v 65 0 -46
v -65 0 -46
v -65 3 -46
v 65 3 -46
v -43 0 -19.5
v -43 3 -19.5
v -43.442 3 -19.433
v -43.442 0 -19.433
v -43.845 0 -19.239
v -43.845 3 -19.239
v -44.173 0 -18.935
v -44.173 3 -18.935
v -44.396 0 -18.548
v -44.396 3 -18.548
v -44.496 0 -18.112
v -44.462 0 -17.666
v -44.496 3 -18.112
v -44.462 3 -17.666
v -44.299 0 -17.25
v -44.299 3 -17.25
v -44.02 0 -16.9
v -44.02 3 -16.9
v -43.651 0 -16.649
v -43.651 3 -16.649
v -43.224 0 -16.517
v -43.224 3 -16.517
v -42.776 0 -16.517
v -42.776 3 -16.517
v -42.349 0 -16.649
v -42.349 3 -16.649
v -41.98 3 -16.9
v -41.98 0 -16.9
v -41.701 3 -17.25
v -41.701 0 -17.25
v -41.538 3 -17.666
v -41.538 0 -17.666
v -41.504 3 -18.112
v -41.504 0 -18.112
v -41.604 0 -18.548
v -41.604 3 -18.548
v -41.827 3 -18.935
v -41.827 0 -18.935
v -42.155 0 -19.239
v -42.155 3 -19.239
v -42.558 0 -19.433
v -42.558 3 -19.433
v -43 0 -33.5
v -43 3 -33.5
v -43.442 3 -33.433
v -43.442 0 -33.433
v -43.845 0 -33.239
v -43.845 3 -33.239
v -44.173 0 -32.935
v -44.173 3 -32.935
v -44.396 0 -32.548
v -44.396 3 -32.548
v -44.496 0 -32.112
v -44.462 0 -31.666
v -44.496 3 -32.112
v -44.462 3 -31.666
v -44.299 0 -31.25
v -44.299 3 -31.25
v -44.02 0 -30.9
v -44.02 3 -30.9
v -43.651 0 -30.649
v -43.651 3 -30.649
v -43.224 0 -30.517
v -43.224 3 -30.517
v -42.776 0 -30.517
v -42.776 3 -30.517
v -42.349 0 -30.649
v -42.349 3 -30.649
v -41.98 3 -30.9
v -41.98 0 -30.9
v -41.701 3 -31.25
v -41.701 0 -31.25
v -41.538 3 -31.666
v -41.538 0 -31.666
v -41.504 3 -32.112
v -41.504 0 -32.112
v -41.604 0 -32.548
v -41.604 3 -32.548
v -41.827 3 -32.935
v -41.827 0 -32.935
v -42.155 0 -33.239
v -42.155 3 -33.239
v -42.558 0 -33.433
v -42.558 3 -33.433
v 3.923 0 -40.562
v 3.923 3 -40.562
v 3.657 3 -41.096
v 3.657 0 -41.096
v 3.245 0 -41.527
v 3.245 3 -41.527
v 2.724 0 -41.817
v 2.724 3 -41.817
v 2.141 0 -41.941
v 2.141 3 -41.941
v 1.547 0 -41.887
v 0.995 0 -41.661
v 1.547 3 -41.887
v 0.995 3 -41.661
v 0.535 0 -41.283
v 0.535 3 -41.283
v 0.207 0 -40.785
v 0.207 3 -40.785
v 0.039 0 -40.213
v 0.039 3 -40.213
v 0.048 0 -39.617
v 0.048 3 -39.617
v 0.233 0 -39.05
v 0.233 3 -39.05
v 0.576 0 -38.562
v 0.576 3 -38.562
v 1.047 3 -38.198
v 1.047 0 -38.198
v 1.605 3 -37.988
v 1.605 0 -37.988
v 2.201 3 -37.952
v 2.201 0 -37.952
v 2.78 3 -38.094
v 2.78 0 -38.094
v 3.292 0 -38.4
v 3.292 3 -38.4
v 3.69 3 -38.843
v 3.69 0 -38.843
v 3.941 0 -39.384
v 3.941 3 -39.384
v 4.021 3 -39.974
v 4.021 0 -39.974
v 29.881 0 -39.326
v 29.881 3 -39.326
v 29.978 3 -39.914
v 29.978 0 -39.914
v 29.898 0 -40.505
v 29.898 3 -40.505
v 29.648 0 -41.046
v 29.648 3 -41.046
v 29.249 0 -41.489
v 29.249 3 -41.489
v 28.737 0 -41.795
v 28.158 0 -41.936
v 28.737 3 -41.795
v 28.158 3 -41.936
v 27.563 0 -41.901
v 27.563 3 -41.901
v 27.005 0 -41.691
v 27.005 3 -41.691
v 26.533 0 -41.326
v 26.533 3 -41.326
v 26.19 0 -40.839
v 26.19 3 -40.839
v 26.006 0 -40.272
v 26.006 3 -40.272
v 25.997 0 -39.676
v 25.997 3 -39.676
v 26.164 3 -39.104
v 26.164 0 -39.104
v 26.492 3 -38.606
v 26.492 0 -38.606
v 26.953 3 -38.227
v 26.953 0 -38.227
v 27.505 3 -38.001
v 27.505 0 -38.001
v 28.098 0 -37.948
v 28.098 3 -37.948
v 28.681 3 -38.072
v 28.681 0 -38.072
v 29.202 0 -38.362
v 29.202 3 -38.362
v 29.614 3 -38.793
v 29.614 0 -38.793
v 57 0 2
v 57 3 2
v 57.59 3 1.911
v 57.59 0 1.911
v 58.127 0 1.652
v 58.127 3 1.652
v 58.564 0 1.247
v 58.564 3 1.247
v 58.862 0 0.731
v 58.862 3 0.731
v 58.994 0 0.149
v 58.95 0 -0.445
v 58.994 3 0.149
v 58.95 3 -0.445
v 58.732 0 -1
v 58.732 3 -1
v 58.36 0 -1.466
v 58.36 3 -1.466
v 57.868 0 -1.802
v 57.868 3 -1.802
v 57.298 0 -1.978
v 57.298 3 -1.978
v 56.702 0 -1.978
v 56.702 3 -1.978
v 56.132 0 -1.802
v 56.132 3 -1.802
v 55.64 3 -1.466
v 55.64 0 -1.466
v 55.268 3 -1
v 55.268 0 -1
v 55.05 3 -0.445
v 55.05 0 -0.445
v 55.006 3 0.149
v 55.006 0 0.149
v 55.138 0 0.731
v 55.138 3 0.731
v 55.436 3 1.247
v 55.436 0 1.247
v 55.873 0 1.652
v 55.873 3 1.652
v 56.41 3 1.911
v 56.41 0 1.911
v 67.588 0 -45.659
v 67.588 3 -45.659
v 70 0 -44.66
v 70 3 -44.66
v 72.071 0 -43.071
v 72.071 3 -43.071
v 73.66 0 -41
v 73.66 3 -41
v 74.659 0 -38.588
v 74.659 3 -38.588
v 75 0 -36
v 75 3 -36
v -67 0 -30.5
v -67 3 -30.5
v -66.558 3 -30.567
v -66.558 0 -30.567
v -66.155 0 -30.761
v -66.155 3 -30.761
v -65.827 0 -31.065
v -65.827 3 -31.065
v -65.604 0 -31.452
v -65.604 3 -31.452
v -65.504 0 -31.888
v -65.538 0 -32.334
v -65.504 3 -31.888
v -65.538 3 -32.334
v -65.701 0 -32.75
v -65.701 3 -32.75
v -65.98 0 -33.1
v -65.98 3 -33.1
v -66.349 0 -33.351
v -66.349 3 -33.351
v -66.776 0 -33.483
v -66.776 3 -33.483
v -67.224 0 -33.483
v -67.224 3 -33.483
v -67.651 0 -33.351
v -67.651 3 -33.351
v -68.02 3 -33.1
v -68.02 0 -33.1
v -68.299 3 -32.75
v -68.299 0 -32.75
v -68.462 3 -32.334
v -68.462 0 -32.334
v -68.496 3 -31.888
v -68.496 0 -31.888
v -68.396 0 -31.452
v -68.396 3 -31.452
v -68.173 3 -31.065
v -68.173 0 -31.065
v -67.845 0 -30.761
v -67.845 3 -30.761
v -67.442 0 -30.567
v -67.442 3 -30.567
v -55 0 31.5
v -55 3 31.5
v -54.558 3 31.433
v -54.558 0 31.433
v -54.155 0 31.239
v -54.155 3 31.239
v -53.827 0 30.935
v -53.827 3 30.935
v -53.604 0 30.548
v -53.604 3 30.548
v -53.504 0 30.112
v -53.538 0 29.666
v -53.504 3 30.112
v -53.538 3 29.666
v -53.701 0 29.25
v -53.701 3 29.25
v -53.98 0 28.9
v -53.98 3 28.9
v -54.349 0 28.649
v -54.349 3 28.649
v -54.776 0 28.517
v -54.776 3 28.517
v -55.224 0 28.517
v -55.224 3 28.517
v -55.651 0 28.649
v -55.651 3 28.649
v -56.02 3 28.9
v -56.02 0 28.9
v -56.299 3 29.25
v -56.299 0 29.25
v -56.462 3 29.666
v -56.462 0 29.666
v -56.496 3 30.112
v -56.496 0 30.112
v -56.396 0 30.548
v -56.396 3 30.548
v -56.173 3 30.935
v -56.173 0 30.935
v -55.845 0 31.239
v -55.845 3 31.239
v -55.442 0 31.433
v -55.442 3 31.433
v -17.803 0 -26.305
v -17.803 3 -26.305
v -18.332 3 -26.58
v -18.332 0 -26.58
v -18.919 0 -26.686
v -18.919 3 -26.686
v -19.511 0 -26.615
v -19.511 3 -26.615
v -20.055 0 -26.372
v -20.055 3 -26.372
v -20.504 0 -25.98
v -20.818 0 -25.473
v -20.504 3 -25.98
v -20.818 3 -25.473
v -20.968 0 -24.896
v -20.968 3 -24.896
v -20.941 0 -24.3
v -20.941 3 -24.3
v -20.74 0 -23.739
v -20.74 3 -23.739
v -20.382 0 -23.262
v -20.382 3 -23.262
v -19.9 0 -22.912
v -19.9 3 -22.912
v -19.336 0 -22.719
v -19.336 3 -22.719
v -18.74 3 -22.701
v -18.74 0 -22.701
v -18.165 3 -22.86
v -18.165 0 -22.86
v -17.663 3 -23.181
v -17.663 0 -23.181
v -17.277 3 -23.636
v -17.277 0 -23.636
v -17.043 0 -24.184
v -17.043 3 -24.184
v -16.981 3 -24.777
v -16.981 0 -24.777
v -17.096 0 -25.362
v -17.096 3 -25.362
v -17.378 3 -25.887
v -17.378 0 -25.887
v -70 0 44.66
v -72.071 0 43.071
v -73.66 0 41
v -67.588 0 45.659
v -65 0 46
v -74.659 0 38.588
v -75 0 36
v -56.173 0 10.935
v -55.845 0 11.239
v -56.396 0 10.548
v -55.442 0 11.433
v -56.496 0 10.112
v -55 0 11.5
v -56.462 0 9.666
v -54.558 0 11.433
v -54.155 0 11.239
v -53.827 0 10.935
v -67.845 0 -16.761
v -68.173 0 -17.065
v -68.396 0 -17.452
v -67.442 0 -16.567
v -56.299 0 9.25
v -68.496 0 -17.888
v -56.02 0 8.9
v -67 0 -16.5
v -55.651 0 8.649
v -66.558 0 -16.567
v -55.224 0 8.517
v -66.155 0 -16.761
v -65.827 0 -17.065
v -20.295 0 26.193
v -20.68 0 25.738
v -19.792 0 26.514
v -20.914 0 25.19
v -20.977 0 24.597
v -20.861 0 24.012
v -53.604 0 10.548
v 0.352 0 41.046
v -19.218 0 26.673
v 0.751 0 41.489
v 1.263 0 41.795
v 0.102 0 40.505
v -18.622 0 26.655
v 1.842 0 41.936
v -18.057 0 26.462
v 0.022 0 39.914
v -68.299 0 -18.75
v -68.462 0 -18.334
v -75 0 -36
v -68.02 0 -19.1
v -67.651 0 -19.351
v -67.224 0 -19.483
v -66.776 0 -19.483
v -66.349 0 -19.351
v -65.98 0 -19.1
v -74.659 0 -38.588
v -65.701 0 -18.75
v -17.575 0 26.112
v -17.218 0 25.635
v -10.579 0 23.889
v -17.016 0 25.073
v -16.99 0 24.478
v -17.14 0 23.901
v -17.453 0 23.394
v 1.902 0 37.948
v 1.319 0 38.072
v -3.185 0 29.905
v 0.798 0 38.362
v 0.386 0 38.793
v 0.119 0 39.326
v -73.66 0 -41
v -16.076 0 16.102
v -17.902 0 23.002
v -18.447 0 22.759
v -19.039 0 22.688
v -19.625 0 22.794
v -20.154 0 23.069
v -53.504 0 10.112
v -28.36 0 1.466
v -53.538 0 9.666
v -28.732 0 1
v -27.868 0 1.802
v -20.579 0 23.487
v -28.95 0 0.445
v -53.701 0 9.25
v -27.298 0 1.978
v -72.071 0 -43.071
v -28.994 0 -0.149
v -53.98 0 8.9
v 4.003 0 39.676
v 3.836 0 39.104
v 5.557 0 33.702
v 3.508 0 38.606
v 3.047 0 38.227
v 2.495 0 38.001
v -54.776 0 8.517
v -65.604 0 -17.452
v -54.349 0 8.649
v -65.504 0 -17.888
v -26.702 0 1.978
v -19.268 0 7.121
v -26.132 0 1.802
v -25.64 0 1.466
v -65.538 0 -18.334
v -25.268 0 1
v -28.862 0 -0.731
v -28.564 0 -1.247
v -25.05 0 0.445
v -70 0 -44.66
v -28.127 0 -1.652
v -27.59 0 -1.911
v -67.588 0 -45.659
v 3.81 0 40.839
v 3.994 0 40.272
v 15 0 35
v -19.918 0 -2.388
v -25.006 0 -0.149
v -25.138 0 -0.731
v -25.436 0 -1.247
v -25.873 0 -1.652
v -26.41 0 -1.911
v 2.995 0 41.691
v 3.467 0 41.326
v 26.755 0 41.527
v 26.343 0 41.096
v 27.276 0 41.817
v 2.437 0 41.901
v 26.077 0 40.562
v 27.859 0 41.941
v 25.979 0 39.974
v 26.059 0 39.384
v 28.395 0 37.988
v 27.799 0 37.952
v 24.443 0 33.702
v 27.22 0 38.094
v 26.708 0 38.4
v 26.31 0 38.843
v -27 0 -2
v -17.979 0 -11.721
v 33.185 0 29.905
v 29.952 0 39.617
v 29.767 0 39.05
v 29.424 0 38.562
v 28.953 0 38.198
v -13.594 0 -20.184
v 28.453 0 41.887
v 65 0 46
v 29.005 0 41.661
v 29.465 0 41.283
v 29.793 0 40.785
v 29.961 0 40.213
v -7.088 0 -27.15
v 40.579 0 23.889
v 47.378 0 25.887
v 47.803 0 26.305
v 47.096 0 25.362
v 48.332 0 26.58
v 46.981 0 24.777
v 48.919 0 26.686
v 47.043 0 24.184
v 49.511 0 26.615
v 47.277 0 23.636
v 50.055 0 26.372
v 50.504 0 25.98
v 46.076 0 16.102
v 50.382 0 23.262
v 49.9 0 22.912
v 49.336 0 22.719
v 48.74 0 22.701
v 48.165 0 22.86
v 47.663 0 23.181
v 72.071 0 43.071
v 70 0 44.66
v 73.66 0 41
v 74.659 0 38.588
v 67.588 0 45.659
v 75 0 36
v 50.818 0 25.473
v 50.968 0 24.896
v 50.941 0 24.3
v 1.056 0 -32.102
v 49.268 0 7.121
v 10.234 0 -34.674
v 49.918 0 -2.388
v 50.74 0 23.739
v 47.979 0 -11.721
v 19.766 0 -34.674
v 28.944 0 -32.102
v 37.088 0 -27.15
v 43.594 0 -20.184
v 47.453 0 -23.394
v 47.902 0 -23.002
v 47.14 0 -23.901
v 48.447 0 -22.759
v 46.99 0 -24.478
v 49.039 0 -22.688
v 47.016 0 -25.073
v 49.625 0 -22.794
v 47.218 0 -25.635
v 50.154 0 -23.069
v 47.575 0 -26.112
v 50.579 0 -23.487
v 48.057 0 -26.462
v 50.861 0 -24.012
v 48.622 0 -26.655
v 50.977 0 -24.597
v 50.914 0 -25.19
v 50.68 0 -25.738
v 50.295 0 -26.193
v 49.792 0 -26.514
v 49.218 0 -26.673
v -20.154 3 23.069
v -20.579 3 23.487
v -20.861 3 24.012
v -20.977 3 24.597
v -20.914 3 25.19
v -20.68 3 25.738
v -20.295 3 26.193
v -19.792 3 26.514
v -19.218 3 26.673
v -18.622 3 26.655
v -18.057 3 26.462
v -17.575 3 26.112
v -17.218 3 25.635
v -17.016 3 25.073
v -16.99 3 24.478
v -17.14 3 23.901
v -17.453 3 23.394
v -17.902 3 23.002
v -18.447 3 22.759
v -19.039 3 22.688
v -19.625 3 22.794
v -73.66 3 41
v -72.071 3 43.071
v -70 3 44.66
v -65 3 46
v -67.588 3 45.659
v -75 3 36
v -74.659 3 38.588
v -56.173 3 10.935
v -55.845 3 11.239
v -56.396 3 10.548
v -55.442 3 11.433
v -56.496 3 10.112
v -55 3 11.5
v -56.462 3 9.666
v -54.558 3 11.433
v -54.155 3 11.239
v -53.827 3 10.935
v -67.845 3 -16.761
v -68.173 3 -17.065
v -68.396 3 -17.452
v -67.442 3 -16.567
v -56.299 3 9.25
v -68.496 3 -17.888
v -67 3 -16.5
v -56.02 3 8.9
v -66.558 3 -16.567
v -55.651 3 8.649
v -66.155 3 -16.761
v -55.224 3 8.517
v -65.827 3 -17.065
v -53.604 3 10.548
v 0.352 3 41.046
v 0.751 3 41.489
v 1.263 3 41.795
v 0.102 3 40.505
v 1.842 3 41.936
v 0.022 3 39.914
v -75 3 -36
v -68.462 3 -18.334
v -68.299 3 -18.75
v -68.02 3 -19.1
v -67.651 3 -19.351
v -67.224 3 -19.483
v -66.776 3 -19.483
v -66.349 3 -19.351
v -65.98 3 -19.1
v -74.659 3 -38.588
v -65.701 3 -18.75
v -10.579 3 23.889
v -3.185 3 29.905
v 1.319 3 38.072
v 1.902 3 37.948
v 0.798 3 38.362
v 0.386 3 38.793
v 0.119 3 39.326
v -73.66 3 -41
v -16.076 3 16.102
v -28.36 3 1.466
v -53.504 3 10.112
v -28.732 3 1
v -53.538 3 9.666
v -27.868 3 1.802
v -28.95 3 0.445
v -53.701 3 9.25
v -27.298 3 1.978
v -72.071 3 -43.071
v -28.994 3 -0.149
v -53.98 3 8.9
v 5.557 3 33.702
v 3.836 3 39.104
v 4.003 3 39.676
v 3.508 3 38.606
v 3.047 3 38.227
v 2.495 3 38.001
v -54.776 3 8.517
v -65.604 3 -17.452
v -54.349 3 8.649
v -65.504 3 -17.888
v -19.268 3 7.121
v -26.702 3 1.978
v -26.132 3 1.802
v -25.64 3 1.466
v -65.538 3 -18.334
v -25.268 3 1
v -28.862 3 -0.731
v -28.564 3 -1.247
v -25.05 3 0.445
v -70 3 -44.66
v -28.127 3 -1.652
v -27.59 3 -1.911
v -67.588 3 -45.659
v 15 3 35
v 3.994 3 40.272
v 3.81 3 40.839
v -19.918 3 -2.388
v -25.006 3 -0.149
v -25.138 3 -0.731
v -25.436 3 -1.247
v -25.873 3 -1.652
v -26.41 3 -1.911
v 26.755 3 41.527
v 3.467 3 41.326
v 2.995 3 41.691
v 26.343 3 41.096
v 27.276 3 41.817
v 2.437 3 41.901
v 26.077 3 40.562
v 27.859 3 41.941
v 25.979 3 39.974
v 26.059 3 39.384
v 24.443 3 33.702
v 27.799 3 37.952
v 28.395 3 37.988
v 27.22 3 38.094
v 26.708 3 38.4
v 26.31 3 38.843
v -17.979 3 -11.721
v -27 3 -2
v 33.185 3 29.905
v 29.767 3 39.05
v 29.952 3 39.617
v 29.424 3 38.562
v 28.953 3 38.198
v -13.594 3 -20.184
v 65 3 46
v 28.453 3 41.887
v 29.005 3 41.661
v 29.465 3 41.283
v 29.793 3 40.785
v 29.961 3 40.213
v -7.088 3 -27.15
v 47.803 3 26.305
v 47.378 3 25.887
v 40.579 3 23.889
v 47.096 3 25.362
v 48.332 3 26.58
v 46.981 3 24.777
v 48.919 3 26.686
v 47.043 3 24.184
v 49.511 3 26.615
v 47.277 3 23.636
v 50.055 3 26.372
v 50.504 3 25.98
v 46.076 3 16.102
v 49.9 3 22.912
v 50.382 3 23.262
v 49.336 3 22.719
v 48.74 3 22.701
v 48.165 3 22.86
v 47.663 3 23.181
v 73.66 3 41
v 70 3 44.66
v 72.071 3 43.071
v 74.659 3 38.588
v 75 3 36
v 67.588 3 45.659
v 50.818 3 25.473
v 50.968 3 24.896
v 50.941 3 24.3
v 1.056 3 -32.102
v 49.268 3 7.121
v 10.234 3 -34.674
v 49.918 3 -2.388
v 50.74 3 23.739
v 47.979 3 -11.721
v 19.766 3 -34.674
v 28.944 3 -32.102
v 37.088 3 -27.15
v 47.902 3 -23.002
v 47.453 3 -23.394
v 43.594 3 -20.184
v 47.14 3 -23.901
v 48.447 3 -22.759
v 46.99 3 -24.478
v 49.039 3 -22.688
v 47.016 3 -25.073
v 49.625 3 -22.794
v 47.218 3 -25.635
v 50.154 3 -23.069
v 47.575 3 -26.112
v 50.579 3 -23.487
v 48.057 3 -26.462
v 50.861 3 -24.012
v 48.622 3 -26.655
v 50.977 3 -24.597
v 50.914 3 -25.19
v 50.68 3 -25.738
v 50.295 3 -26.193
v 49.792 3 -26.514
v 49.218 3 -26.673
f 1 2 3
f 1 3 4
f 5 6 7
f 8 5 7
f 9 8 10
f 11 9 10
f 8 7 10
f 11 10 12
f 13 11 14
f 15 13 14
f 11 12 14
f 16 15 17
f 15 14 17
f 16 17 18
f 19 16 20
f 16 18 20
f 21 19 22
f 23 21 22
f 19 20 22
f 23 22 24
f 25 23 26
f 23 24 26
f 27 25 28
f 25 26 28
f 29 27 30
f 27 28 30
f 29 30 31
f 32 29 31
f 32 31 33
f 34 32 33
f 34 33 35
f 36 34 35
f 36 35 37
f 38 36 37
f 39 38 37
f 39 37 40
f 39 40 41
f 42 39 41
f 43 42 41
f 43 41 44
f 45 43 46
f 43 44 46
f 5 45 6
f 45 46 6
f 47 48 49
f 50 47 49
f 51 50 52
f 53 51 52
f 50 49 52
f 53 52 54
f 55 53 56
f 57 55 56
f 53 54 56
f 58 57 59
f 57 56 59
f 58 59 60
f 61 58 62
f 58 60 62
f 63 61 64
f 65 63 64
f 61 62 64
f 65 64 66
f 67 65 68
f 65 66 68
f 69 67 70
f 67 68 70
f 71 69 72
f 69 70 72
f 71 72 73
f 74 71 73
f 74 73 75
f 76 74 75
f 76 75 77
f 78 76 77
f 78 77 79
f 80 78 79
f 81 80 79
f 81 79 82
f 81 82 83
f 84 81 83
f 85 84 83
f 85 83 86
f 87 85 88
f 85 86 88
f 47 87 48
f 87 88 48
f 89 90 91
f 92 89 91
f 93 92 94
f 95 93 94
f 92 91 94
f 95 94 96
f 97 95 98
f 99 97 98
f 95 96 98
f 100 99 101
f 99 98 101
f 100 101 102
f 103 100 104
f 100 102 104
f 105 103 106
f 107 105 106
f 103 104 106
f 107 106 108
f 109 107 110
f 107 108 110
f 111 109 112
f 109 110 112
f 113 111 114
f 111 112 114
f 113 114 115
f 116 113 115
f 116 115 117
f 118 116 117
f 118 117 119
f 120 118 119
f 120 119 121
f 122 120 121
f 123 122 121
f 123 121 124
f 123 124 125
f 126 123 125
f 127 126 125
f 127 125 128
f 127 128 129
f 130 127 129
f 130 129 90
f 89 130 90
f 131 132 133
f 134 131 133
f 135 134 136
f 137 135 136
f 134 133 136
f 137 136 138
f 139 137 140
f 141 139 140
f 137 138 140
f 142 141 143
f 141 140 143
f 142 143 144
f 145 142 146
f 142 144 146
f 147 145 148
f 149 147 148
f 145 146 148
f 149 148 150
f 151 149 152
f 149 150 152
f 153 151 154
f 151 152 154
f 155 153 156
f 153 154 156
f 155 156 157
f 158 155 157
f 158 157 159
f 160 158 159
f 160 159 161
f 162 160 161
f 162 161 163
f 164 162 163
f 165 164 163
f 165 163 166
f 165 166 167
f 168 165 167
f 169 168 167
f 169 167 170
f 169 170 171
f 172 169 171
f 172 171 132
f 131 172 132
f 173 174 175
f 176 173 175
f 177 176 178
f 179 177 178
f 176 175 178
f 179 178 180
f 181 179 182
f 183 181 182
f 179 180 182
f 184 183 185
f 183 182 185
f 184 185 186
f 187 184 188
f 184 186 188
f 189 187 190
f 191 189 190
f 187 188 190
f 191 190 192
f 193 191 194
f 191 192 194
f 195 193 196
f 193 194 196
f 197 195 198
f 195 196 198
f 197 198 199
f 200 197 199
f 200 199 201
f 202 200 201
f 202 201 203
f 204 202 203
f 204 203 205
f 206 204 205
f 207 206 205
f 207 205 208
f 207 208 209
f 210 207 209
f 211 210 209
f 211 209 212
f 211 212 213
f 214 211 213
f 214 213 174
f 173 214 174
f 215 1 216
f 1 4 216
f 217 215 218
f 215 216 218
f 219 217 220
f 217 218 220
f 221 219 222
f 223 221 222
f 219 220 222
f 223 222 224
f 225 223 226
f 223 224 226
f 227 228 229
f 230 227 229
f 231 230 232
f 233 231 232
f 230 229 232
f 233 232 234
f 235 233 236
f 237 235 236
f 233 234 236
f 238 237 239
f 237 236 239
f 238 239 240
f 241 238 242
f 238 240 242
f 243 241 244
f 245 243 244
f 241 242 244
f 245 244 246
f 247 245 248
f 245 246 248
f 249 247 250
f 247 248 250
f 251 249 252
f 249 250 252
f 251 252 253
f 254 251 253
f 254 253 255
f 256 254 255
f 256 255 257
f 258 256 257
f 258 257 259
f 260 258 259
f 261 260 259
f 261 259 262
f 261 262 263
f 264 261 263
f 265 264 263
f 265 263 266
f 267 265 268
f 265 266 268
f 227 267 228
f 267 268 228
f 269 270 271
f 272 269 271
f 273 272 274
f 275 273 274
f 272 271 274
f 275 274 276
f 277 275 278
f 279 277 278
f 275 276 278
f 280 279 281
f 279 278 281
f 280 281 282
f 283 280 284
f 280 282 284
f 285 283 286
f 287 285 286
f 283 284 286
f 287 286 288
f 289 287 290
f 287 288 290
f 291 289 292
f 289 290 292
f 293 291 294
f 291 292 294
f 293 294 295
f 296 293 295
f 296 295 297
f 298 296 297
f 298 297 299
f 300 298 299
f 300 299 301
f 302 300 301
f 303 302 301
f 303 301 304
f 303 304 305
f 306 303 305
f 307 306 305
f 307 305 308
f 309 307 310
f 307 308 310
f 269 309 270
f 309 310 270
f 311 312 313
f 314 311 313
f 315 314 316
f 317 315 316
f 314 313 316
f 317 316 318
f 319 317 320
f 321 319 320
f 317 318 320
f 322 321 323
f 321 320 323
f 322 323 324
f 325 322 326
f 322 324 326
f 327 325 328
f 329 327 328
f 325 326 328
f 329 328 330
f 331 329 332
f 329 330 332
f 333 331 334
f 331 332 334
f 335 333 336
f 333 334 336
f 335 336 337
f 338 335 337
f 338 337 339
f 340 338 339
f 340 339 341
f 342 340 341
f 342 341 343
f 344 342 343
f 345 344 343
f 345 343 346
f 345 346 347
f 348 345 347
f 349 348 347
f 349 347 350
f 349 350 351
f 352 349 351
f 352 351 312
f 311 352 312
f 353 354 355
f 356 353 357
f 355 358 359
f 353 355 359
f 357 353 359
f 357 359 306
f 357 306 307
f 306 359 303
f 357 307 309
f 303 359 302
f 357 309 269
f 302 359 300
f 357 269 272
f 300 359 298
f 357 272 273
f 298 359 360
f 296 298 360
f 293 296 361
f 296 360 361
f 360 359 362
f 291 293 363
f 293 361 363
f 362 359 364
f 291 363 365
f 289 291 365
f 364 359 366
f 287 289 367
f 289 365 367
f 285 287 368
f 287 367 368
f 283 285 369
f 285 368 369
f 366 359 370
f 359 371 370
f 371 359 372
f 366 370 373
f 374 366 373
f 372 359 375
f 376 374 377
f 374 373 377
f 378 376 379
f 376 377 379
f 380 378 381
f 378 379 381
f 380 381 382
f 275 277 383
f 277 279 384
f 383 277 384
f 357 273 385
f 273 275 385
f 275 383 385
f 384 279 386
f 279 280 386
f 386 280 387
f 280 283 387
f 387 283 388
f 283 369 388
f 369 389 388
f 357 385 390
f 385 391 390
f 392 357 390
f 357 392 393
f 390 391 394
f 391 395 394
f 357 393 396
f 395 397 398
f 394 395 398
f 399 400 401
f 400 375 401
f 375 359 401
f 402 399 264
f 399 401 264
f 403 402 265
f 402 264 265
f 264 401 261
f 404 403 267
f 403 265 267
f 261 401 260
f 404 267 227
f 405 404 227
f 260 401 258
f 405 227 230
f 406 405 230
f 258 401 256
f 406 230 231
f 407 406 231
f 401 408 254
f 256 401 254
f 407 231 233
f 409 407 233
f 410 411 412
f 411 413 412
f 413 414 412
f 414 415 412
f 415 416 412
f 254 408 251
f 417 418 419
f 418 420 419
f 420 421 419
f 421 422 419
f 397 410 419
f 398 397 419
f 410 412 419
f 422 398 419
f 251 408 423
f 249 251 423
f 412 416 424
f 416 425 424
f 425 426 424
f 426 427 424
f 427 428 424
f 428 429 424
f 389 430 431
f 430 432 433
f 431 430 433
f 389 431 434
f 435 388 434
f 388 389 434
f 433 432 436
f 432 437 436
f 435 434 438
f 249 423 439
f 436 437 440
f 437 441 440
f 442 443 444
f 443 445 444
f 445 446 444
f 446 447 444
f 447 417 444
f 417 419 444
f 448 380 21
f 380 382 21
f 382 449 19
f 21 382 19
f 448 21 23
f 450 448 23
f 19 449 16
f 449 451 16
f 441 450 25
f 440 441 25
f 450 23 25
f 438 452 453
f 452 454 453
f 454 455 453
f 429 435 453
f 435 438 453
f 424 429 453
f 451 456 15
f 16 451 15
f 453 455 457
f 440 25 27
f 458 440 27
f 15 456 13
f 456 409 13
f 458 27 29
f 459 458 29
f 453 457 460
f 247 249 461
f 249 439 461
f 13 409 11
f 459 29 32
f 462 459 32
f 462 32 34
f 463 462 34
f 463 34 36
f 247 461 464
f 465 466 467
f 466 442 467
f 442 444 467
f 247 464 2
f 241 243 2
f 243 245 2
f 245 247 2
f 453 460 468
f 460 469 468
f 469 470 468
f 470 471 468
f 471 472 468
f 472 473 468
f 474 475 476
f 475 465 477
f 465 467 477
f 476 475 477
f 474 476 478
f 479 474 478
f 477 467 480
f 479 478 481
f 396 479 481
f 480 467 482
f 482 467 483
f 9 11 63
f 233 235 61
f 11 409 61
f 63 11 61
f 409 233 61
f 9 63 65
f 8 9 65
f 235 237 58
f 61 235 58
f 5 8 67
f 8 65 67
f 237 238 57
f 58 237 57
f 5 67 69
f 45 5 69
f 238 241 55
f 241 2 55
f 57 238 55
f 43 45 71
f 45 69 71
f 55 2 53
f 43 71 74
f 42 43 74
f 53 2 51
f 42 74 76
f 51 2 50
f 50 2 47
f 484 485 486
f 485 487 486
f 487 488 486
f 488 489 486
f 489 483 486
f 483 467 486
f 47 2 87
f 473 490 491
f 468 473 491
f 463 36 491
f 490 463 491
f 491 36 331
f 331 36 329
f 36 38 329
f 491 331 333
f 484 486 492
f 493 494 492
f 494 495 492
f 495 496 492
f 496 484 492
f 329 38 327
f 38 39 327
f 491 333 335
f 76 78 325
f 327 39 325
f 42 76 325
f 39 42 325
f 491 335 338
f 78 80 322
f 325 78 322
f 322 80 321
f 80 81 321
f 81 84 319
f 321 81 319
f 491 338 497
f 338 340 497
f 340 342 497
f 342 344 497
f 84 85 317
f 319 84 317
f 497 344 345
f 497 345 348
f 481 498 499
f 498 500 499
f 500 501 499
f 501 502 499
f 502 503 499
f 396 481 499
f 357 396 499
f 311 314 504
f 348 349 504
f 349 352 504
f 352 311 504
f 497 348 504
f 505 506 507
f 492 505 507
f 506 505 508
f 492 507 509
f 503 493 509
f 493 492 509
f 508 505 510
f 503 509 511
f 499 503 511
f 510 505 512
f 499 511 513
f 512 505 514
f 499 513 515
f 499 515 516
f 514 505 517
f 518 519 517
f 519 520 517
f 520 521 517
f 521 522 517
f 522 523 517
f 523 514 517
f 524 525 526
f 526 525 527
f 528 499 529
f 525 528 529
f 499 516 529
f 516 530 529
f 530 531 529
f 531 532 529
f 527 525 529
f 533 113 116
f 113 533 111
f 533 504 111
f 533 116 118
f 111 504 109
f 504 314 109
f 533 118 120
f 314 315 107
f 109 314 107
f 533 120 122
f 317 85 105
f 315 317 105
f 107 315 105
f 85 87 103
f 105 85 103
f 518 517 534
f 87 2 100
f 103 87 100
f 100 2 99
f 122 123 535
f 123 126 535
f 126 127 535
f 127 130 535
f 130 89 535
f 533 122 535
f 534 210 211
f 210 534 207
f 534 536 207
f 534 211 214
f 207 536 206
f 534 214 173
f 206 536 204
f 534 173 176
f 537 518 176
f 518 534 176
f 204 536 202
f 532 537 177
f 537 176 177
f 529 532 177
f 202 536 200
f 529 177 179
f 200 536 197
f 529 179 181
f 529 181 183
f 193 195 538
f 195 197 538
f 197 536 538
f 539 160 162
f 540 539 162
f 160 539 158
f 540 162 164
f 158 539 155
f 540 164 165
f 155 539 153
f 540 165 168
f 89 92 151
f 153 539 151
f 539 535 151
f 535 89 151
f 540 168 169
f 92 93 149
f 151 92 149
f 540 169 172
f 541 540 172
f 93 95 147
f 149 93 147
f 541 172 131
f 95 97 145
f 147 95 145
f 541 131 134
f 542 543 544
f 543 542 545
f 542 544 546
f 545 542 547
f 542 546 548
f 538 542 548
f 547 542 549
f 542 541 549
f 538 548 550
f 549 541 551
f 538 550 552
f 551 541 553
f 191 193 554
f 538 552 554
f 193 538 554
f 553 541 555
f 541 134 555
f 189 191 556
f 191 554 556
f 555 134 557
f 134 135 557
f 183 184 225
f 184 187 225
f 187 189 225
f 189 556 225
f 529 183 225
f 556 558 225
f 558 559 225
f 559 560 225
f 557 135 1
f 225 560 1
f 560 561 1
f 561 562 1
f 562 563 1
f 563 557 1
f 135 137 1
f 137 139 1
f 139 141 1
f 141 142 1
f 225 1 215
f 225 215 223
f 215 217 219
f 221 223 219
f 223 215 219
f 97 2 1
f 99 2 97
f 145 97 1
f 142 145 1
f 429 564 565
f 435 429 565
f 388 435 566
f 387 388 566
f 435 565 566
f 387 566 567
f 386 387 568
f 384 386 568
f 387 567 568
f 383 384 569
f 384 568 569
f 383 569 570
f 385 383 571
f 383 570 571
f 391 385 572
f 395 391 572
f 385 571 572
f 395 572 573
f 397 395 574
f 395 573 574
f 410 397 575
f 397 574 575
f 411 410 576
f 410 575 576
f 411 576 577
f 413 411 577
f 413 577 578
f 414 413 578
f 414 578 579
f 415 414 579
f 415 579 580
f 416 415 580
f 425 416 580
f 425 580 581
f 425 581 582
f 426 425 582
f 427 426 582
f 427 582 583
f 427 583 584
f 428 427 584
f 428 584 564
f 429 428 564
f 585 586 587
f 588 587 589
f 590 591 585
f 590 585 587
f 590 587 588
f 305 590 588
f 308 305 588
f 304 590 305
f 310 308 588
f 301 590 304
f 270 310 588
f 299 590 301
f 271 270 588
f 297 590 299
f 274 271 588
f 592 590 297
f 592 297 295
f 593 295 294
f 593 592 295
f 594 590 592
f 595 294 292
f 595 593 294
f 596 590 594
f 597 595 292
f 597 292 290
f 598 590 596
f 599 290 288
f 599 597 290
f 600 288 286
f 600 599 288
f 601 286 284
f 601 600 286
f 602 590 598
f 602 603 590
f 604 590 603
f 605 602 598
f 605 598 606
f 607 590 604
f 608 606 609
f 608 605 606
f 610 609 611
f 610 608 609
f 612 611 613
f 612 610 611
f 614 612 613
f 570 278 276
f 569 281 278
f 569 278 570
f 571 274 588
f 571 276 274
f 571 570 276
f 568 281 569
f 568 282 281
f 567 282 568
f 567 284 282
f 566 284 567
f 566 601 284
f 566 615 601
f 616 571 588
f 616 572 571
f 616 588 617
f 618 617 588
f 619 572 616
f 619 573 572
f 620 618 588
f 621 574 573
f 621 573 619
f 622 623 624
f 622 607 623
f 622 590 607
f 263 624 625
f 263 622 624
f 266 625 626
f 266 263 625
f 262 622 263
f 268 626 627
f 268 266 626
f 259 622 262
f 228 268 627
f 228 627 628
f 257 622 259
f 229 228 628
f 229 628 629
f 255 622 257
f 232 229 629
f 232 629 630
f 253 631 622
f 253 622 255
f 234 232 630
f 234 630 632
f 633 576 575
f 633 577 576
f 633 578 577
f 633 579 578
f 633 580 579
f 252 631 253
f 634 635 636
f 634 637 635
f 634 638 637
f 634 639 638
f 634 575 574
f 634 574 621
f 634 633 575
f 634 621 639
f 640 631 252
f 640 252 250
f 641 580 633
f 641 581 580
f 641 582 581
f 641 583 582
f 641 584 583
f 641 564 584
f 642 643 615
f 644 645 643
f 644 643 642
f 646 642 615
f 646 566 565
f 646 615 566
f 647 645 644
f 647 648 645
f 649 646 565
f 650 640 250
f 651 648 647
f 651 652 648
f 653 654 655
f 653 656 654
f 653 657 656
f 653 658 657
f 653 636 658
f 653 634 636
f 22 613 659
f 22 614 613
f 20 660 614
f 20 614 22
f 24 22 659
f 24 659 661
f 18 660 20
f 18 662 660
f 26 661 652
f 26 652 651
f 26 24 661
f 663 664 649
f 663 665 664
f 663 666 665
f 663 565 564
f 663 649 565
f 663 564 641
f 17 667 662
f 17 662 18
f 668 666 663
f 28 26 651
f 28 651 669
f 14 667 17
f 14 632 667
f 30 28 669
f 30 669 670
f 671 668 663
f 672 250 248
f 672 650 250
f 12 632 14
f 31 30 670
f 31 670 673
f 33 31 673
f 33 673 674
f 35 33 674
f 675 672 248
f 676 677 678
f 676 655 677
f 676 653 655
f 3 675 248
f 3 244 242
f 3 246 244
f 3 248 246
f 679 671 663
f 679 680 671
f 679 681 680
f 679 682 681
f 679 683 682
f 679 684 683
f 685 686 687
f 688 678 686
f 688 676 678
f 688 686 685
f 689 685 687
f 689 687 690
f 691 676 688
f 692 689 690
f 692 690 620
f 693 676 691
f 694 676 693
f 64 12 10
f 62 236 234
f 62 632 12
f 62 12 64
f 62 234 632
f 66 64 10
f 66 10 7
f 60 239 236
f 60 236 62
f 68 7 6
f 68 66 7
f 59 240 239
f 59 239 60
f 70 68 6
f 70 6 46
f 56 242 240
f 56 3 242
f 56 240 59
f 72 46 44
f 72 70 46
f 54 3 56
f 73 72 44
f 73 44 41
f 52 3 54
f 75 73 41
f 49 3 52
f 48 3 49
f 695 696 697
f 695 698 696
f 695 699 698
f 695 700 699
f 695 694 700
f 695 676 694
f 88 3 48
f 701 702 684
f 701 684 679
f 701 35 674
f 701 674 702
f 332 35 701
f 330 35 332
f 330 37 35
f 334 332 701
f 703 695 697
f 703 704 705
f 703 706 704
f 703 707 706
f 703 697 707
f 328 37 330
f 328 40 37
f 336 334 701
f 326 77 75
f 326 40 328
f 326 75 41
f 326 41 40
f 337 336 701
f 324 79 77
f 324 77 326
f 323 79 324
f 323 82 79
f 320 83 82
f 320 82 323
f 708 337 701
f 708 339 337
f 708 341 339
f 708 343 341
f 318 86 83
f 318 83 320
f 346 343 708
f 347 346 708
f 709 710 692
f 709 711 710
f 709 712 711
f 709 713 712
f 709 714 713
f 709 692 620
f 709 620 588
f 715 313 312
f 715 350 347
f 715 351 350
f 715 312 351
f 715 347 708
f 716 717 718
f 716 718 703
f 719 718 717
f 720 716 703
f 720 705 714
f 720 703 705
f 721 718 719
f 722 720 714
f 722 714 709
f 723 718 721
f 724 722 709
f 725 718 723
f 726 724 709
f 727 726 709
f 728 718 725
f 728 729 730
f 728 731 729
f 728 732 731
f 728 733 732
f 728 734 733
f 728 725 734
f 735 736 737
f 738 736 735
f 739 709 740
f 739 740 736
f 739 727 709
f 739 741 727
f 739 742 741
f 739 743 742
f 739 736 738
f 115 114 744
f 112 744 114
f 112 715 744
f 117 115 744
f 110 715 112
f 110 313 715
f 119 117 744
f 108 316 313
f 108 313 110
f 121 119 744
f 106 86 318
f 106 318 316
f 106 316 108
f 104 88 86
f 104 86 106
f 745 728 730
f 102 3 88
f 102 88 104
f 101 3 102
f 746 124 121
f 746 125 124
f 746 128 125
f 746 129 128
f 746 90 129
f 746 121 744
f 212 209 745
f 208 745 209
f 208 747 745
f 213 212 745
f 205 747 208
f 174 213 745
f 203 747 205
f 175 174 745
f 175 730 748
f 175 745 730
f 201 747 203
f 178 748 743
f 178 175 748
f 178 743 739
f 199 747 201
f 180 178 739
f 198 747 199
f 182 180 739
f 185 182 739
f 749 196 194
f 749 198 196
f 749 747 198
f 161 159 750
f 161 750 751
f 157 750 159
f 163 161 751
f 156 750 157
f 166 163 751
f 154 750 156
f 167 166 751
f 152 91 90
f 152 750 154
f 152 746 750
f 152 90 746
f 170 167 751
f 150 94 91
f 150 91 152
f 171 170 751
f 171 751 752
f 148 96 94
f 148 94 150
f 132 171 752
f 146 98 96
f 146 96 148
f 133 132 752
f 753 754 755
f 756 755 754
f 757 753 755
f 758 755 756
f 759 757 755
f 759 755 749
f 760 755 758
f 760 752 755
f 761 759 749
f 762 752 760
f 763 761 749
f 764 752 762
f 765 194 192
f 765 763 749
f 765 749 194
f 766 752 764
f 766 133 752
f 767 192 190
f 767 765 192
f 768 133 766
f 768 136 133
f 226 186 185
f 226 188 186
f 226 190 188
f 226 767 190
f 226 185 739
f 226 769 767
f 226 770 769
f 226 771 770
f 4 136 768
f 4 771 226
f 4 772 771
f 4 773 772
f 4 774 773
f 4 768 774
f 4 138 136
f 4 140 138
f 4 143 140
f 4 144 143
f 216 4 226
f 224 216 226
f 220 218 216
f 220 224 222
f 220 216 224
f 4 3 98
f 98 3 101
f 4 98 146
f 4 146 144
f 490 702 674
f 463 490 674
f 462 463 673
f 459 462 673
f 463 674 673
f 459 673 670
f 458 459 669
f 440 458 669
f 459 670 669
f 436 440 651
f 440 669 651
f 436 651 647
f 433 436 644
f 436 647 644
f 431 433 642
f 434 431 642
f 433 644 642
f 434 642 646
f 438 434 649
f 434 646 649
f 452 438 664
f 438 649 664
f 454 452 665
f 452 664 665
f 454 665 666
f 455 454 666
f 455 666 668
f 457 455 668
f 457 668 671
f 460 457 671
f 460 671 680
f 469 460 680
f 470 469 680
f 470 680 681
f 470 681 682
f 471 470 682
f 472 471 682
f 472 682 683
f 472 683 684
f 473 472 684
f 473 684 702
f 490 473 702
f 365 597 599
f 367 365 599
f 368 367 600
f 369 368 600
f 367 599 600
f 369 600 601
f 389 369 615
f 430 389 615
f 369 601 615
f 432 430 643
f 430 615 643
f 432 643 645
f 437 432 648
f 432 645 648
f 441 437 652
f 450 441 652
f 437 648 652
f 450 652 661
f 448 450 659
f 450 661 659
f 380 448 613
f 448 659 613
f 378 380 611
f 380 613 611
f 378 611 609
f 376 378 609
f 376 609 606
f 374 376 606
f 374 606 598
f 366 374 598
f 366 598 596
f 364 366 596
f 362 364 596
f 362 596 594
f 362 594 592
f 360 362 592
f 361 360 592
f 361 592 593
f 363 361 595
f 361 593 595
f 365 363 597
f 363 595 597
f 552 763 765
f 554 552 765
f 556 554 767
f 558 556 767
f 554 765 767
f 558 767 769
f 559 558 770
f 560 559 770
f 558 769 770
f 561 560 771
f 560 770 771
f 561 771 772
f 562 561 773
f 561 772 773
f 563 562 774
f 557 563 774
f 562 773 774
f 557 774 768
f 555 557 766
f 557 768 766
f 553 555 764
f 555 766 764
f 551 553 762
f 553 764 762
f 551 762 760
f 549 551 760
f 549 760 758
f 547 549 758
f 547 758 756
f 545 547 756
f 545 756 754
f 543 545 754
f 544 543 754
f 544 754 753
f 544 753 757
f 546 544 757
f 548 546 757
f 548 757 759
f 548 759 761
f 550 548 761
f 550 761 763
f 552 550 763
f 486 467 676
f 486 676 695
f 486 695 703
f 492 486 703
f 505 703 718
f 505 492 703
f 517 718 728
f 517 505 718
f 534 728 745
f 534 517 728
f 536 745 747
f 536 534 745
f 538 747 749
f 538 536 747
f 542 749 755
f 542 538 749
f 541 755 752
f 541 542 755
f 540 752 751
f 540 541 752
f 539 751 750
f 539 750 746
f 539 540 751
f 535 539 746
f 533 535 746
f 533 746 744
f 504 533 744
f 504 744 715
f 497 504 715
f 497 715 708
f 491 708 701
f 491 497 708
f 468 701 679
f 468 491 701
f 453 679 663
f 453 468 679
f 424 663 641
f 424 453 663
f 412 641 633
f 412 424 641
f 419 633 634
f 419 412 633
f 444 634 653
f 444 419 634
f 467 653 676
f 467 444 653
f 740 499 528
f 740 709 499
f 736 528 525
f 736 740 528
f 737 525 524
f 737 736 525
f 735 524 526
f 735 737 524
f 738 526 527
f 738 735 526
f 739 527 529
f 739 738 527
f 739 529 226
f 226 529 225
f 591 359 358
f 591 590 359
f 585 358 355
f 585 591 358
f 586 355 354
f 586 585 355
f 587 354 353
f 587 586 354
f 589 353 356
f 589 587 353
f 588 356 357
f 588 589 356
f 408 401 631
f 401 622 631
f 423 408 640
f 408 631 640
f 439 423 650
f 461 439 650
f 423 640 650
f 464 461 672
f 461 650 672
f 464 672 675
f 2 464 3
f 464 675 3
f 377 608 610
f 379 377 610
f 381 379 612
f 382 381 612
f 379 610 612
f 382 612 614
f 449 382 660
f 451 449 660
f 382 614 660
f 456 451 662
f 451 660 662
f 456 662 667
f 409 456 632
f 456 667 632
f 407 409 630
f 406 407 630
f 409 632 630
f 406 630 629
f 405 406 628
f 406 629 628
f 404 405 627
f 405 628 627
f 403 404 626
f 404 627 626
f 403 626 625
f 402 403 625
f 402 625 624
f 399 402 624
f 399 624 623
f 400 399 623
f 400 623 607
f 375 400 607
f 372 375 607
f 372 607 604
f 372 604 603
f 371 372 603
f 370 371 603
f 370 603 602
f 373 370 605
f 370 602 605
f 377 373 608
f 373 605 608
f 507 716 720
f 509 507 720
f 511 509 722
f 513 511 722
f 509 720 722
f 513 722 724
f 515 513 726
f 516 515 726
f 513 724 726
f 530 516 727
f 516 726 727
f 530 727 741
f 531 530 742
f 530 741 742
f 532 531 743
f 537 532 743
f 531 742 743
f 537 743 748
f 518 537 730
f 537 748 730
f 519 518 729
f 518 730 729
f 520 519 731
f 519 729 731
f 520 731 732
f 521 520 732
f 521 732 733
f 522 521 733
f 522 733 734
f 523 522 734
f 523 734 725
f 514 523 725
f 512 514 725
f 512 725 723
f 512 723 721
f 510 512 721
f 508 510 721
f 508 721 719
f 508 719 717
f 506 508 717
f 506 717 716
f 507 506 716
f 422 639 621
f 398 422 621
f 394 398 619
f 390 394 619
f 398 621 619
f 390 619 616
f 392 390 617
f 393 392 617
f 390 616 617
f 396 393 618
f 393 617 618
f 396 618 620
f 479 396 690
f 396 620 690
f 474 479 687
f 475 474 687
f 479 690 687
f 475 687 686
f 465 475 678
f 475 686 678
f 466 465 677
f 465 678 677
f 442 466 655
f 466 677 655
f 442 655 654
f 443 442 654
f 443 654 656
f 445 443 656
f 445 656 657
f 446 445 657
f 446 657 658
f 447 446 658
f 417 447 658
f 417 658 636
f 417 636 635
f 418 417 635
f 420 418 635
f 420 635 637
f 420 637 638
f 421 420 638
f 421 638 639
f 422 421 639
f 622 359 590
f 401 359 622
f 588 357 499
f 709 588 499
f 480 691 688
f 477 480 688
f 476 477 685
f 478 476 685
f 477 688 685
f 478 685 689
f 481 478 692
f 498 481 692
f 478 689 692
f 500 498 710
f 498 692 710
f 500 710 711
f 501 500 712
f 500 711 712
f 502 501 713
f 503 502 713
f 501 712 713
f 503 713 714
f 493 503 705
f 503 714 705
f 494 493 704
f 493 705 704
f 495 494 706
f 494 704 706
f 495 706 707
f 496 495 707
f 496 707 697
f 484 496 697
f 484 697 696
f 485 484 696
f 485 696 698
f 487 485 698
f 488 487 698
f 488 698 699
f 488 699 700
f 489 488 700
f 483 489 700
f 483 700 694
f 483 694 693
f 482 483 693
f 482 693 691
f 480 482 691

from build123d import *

# Parameters (mm, degrees)
SKETCH_1_W               = 150
SKETCH_1_H               = 92
SKETCH_1_R               = 35
EXTRUDE_1_DEPTH          = 3
CUT_EXTRUDE_1_REACH      = 90.034
SKETCH_2_R               = 2
PATTERN_CIRCULAR_1_COUNT = 10
SKETCH_3_R               = 1.5
CUT_EXTRUDE_2_DEPTH      = 3
FILLET_1_R               = 10


with BuildPart() as part:
    # 草圖1 → 填料-伸長1 (new body)
    with BuildSketch(Plane(origin=(0, 0, 0), x_dir=(1, 0, 0), z_dir=(0, 1, 0))):
        Rectangle(SKETCH_1_W, SKETCH_1_H)
        with Locations(Location((15, 0, 0), (0, 0, 270))):
            Circle(SKETCH_1_R, mode=Mode.SUBTRACT)
    extrude(amount=EXTRUDE_1_DEPTH)

    # 草圖2 → 除料-伸長1 (cut, up to next)
    with BuildSketch(Plane(origin=(0, 3, 0), x_dir=(1, 0, 0), z_dir=(0, 1, 0)), mode=Mode.PRIVATE) as cut_extrude_1_sk1:
        with Locations(Location((57, 0, 0), (0, 0, 270))):
            Circle(SKETCH_2_R)
    cut_extrude_1_tool1 = extrude(cut_extrude_1_sk1.sketch, amount=-CUT_EXTRUDE_1_REACH, mode=Mode.PRIVATE) & part.part
    cut_extrude_1 = cut_extrude_1_tool1.solids().sort_by_distance((57, 3, 0))[0]
    add(cut_extrude_1, mode=Mode.SUBTRACT)

    # 環狀複製排列1: 除料-伸長1 ×10 about axis
    pattern_circular_1_axis = Axis((15, 0, 0), (0, 1, 0))
    for i in range(1, PATTERN_CIRCULAR_1_COUNT):
        add(cut_extrude_1.rotate(pattern_circular_1_axis, i * 360 / PATTERN_CIRCULAR_1_COUNT), mode=Mode.SUBTRACT)

    # 草圖3 → 除料-伸長2 (cut)
    with BuildSketch(Plane(origin=(0, 3, 0), x_dir=(1, 0, 0), z_dir=(0, 1, 0))):
        with Locations(Location((-67, 32, 0), (0, 0, 270))):
            Circle(SKETCH_3_R)
        with Locations(Location((-67, 18, 0), (0, 0, 270))):
            Circle(SKETCH_3_R)
        with Locations(Location((-43, 18, 0), (0, 0, 90))):
            Circle(SKETCH_3_R)
        with Locations(Location((-43, 32, 0), (0, 0, 90))):
            Circle(SKETCH_3_R)
        with Locations(Location((-55, -10, 0), (0, 0, 270))):
            Circle(SKETCH_3_R)
        with Locations(Location((-55, -30, 0), (0, 0, 270))):
            Circle(SKETCH_3_R)
    extrude(amount=-CUT_EXTRUDE_2_DEPTH, mode=Mode.SUBTRACT)

    # 圓角1
    fillet_1_edges = [part.edges().sort_by_distance(p)[0] for p in [
        (75, 1.5, 46),
        (-75, 1.5, 46),
        (-75, 1.5, -46),
        (75, 1.5, -46),
    ]]
    fillet(fillet_1_edges, radius=FILLET_1_R)


solid = part.part
